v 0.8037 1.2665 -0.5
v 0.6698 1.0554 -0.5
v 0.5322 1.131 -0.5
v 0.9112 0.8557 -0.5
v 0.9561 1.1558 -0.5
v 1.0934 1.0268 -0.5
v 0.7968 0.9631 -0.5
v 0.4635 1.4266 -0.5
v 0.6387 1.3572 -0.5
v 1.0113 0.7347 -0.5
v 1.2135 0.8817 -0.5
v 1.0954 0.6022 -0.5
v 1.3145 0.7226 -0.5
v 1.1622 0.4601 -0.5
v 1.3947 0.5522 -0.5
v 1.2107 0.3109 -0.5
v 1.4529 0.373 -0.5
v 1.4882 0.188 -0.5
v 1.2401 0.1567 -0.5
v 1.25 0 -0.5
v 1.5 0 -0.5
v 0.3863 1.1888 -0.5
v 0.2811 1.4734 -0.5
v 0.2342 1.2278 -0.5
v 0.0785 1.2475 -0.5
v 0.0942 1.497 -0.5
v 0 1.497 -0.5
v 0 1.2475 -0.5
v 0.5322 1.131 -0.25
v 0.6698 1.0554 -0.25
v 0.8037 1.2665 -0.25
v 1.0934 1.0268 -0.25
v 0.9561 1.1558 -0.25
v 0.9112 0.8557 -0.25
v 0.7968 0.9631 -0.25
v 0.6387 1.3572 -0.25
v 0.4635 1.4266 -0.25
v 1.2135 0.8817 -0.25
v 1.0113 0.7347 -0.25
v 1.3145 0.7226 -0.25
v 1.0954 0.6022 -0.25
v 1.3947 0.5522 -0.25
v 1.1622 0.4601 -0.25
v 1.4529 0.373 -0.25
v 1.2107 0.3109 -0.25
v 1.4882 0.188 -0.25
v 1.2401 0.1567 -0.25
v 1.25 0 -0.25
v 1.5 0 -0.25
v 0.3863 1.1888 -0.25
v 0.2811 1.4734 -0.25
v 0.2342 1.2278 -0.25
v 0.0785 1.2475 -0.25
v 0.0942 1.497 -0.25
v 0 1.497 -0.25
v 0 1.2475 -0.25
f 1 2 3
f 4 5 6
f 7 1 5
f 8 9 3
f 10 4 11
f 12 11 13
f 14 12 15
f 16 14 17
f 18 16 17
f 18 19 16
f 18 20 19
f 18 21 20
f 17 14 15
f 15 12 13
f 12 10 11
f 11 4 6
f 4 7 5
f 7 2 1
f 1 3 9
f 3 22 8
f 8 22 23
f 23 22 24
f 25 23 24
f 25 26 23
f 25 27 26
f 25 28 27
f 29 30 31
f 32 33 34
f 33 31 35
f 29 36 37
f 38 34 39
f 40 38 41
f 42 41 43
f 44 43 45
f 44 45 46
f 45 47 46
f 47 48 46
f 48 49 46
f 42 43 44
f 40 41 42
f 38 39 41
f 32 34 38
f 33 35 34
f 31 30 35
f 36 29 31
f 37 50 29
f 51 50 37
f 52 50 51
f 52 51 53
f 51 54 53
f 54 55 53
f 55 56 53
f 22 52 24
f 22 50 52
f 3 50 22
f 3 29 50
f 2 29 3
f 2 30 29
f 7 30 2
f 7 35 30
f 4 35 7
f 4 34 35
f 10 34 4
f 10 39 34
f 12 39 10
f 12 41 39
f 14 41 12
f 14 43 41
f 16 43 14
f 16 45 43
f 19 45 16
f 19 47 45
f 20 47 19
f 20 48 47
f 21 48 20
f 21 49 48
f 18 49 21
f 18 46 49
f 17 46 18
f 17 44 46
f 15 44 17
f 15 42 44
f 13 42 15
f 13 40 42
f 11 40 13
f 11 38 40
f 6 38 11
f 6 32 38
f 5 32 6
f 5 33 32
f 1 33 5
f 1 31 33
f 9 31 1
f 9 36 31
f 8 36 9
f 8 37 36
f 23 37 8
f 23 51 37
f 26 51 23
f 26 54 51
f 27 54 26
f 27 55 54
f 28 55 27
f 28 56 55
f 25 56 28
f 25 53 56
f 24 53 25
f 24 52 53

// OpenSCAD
// Curve Writing Parametric Module
// https://openhome.cc/eGossip/OpenSCAD/SectorArc.html
height = 0.25;

module sector(radius, angles, fn = 24) {
    r = radius / cos(180 / fn);
    step = -360 / fn;

    points = concat([[0, 0]],
        [for(a = [angles[0] : step : angles[1] - 360]) 
            [r * cos(a), r * sin(a)]
        ],
        [[r * cos(angles[1]), r * sin(angles[1])]]
    );

    difference() {
        circle(radius, $fn = fn);
        polygon(points);
    }
}

module arc(radius, angles, width = 1, fn = 24) {
    difference() {
        sector(radius + width, angles, fn);
        sector(radius, angles, fn);
    }
}

//2x2 90
translate([0,0,-0.5])
scale([1,1,1])
linear_extrude(height)
    arc(1.25, [0,90], 0.25, 50);
